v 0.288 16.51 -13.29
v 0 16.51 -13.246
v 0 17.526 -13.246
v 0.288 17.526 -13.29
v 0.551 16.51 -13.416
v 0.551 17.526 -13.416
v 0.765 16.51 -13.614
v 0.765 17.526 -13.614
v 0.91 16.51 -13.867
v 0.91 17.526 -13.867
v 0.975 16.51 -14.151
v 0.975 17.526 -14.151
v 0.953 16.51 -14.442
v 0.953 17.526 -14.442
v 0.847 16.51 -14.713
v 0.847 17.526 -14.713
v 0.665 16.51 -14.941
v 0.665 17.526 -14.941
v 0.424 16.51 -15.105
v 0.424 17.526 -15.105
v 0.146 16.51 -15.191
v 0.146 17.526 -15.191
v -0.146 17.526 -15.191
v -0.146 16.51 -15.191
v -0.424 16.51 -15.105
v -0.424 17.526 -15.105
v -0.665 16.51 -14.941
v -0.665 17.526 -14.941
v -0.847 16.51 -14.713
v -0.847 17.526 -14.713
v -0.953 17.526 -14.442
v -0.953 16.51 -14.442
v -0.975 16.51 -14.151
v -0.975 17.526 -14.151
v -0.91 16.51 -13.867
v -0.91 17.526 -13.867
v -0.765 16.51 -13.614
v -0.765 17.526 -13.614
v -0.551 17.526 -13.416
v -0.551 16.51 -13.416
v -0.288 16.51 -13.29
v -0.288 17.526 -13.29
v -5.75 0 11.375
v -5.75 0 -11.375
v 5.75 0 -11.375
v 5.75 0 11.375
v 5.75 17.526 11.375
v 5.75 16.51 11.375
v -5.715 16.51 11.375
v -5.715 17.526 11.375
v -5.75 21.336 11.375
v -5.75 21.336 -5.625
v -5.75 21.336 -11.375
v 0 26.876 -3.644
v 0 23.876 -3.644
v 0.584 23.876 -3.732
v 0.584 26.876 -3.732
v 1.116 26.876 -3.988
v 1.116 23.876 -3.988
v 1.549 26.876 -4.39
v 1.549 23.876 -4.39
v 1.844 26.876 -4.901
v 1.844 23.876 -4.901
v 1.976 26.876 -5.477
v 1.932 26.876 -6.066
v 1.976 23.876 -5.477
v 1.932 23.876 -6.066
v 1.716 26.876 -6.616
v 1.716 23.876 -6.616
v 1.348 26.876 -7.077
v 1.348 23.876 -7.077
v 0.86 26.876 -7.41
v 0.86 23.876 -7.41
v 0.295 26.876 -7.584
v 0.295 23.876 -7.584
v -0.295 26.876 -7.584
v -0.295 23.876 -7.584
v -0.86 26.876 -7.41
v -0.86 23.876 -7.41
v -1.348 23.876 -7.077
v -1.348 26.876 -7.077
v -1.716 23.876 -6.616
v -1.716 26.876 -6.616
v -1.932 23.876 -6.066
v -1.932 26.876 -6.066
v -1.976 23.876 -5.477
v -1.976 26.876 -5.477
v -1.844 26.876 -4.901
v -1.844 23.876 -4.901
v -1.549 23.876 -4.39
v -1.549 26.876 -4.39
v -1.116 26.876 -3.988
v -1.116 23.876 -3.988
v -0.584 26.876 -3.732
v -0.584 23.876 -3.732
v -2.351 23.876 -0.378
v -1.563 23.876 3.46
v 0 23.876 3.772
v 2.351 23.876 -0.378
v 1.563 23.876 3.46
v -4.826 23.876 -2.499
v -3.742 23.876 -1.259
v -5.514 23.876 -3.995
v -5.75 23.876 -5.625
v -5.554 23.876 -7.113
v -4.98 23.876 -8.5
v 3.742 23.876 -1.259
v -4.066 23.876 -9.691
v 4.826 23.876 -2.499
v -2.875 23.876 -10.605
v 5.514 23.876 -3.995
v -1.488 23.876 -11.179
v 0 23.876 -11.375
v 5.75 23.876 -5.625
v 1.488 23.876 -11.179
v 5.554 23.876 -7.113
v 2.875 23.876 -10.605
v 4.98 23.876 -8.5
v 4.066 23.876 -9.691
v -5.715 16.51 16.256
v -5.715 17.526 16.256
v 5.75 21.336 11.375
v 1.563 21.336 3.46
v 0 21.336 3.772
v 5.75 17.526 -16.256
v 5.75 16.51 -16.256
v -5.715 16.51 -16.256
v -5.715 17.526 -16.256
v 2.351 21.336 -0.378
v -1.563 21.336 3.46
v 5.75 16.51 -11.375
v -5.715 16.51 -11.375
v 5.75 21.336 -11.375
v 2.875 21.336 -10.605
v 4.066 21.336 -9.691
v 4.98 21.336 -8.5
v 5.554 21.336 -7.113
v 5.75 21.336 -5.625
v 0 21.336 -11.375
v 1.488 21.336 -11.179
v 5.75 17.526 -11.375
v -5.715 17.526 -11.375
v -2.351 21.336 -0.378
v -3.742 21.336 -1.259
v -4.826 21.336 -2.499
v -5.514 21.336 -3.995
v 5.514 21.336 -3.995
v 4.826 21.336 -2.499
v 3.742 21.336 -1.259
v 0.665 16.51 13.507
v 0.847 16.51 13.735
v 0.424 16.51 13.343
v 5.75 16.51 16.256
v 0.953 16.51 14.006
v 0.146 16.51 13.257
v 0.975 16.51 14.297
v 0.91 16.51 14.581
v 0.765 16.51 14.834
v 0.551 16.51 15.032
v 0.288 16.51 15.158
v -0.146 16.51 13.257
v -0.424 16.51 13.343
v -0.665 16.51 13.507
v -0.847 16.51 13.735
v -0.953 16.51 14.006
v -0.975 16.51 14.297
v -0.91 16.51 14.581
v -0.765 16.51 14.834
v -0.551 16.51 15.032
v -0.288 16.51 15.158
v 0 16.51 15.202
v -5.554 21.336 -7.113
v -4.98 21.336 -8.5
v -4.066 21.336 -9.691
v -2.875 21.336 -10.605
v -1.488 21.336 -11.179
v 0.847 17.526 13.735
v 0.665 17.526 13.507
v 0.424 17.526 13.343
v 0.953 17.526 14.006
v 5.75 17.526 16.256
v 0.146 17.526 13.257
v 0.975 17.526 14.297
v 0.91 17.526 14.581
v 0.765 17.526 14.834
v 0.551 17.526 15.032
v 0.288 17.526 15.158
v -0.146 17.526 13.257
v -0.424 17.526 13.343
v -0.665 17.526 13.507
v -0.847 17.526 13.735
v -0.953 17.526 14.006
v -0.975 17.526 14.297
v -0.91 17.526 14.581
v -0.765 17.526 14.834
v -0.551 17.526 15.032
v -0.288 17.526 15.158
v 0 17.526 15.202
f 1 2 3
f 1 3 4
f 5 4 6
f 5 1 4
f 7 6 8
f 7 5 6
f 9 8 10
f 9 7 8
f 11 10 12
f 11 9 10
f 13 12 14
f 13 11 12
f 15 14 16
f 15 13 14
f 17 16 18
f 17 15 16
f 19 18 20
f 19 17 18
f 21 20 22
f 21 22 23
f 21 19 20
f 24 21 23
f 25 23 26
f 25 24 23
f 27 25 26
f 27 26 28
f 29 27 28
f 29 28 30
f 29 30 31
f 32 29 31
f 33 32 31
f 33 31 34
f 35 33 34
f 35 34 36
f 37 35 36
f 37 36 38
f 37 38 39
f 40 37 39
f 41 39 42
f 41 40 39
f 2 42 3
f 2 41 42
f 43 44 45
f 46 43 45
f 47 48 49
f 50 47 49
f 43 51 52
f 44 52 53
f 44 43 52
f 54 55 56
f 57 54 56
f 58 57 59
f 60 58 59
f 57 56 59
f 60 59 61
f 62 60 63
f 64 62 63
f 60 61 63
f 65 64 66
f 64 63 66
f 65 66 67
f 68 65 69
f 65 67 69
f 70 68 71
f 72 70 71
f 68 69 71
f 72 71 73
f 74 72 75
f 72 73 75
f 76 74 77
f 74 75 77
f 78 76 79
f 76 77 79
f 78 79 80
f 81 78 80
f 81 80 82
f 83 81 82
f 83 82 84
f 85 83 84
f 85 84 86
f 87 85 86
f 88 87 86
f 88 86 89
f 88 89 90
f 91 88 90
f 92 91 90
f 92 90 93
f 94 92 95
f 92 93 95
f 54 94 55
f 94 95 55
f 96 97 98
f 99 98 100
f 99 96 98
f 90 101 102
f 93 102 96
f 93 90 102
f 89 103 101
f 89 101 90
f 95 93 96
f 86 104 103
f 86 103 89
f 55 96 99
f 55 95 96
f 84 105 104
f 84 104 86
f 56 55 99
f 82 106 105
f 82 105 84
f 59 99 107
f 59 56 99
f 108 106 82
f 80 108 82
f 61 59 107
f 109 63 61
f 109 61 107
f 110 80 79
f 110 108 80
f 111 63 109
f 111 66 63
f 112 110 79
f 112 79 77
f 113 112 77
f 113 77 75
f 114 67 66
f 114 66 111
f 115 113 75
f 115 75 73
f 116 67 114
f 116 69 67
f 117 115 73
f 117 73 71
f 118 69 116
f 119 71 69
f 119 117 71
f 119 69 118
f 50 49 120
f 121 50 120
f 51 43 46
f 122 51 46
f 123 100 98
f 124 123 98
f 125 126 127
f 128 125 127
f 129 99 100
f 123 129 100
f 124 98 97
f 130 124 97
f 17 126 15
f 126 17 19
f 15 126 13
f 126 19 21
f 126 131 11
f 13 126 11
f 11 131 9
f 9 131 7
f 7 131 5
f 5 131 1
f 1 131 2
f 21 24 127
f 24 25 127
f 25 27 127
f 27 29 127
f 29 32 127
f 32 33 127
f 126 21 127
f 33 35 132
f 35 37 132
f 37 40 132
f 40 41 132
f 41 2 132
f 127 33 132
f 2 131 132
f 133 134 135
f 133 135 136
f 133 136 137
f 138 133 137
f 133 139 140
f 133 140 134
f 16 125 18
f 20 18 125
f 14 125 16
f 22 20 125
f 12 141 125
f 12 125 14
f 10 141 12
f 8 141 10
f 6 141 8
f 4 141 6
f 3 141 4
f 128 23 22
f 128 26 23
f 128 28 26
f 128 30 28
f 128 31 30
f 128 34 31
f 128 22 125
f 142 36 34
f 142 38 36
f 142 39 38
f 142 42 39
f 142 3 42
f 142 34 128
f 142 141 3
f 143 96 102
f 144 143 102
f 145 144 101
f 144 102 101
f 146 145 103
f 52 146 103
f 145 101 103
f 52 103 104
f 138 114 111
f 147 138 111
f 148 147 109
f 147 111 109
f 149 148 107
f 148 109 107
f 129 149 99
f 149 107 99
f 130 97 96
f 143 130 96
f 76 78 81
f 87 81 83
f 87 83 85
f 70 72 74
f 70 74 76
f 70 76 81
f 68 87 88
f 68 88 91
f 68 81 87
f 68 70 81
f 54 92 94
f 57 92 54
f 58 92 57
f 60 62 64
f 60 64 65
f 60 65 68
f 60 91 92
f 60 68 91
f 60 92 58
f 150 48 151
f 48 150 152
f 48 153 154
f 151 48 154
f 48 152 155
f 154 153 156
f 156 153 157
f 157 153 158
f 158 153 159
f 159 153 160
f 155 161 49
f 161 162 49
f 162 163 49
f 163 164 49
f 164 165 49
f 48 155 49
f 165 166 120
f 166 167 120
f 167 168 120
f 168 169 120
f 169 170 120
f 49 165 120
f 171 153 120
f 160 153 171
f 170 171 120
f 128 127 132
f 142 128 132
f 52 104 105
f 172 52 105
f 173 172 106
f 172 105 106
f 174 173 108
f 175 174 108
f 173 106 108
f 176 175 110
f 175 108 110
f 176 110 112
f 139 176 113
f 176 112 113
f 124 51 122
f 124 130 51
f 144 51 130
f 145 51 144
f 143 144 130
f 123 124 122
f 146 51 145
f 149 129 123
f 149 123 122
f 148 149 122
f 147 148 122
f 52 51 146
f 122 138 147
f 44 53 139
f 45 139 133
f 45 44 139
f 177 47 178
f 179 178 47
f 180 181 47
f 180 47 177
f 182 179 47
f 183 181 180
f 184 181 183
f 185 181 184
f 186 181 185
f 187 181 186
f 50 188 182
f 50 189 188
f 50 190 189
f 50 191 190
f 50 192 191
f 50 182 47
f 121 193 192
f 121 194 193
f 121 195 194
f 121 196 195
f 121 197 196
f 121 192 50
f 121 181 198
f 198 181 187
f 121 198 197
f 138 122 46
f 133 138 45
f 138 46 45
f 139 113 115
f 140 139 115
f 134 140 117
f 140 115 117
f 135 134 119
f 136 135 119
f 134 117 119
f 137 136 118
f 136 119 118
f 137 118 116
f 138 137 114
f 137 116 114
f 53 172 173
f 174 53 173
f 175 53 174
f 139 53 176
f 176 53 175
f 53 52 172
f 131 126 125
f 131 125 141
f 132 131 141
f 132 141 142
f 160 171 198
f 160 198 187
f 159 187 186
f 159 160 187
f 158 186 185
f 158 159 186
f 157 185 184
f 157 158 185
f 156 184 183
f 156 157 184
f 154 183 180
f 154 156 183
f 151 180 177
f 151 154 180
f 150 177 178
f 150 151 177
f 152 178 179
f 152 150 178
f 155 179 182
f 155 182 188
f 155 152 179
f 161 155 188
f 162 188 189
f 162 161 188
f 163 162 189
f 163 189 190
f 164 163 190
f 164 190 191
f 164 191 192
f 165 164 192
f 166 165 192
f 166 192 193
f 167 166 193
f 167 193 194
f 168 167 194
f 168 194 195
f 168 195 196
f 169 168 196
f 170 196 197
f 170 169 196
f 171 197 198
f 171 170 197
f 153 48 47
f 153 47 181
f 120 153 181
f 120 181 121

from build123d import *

# Parameters (mm, degrees)
SKETCH1_W             = 11.5
SKETCH1_H             = 22.75
BOSS_EXTRUDE1_DEPTH   = 23.876
SKETCH2_W             = 11.465
SKETCH2_H             = 4.881
SKETCH2_R             = 0.9779
BOSS_EXTRUDE2_DEPTH   = 1.016
BOSS_EXTRUDE2_2_DEPTH = 1.016
CUT_EXTRUDE2_DEPTH    = 2.54
SKETCH4_R             = 1.9812
BOSS_EXTRUDE3_DEPTH   = 3


with BuildPart() as part:
    # Sketch1 → Boss-Extrude1 (new body)
    with BuildSketch(Plane(origin=(0, 0, 0), x_dir=(1, 0, 0), z_dir=(0, 1, 0))):
        Rectangle(SKETCH1_W, SKETCH1_H)
    extrude(amount=BOSS_EXTRUDE1_DEPTH)

    # Sketch3 → Cut-Extrude2 (cut)
    with BuildSketch(Plane(origin=(0, 23.876, 0), x_dir=(1, 0, 0), z_dir=(0, 1, 0))):
        with BuildLine():
            Line((2.351147049, 0.377657096), (1.562534553, -3.459897938))
            Line((1.562534553, -3.459897938), (0, -3.772404849))
            Line((0, -3.772404849), (-1.562534553, -3.459897938))
            Line((-1.562534553, -3.459897938), (-2.351147049, 0.377657096))
            ThreePointArc((-2.351147049, 0.377657096), (-4.826054057, 2.499027794), (-5.75, 5.625))
            Line((-5.75, 5.625), (-5.75, -11.375))
            Line((-5.75, -11.375), (5.75, -11.375))
            Line((5.75, -11.375), (5.75, 5.625))
            ThreePointArc((5.75, 5.625), (4.826054057, 2.499027794), (2.351147049, 0.377657096))
        make_face()
        with BuildLine():
            ThreePointArc((0, 11.375), (4.065863992, 9.690863992), (5.75, 5.625))
            Line((5.75, 5.625), (5.75, 11.375))
            Line((5.75, 11.375), (0, 11.375))
        make_face()
        with BuildLine():
            ThreePointArc((-5.75, 5.625), (-4.065863992, 9.690863992), (0, 11.375))
            Line((0, 11.375), (-5.75, 11.375))
            Line((-5.75, 11.375), (-5.75, 5.625))
        make_face()
    extrude(amount=-CUT_EXTRUDE2_DEPTH, mode=Mode.SUBTRACT)

    # Sketch4 → Boss-Extrude3 (add)
    with BuildSketch(Plane(origin=(0, 23.876, 0), x_dir=(1, 0, 0), z_dir=(0, 1, 0))):
        with Locations(Location((0, 5.625, 0), (0, 0, 270))):
            Circle(SKETCH4_R)
    extrude(amount=BOSS_EXTRUDE3_DEPTH)


with BuildPart() as body_2:
    # Sketch2 → Boss-Extrude2 (new body)
    with BuildSketch(Plane(origin=(0, 16.51, 0), x_dir=(-1, 0, 0), z_dir=(0, 1, 0))):
        with Locations((-0.0175, -13.8155)):
            Rectangle(SKETCH2_W, SKETCH2_H)
        with Locations(Location((0, -14.224, 0), (0, 0, 90))):
            Circle(SKETCH2_R, mode=Mode.SUBTRACT)
    extrude(amount=BOSS_EXTRUDE2_DEPTH)


with BuildPart() as body_3:
    # Sketch2 → Boss-Extrude2 2 (new body)
    with BuildSketch(Plane(origin=(0, 16.51, 0), x_dir=(-1, 0, 0), z_dir=(0, 1, 0))):
        with Locations((-0.0175, 13.8155)):
            Rectangle(SKETCH2_W, SKETCH2_H)
        with Locations(Location((0, 14.224, 0), (0, 0, 90))):
            Circle(SKETCH2_R, mode=Mode.SUBTRACT)
    extrude(amount=BOSS_EXTRUDE2_2_DEPTH)


solid = Compound([part.part, body_2.part, body_3.part])
